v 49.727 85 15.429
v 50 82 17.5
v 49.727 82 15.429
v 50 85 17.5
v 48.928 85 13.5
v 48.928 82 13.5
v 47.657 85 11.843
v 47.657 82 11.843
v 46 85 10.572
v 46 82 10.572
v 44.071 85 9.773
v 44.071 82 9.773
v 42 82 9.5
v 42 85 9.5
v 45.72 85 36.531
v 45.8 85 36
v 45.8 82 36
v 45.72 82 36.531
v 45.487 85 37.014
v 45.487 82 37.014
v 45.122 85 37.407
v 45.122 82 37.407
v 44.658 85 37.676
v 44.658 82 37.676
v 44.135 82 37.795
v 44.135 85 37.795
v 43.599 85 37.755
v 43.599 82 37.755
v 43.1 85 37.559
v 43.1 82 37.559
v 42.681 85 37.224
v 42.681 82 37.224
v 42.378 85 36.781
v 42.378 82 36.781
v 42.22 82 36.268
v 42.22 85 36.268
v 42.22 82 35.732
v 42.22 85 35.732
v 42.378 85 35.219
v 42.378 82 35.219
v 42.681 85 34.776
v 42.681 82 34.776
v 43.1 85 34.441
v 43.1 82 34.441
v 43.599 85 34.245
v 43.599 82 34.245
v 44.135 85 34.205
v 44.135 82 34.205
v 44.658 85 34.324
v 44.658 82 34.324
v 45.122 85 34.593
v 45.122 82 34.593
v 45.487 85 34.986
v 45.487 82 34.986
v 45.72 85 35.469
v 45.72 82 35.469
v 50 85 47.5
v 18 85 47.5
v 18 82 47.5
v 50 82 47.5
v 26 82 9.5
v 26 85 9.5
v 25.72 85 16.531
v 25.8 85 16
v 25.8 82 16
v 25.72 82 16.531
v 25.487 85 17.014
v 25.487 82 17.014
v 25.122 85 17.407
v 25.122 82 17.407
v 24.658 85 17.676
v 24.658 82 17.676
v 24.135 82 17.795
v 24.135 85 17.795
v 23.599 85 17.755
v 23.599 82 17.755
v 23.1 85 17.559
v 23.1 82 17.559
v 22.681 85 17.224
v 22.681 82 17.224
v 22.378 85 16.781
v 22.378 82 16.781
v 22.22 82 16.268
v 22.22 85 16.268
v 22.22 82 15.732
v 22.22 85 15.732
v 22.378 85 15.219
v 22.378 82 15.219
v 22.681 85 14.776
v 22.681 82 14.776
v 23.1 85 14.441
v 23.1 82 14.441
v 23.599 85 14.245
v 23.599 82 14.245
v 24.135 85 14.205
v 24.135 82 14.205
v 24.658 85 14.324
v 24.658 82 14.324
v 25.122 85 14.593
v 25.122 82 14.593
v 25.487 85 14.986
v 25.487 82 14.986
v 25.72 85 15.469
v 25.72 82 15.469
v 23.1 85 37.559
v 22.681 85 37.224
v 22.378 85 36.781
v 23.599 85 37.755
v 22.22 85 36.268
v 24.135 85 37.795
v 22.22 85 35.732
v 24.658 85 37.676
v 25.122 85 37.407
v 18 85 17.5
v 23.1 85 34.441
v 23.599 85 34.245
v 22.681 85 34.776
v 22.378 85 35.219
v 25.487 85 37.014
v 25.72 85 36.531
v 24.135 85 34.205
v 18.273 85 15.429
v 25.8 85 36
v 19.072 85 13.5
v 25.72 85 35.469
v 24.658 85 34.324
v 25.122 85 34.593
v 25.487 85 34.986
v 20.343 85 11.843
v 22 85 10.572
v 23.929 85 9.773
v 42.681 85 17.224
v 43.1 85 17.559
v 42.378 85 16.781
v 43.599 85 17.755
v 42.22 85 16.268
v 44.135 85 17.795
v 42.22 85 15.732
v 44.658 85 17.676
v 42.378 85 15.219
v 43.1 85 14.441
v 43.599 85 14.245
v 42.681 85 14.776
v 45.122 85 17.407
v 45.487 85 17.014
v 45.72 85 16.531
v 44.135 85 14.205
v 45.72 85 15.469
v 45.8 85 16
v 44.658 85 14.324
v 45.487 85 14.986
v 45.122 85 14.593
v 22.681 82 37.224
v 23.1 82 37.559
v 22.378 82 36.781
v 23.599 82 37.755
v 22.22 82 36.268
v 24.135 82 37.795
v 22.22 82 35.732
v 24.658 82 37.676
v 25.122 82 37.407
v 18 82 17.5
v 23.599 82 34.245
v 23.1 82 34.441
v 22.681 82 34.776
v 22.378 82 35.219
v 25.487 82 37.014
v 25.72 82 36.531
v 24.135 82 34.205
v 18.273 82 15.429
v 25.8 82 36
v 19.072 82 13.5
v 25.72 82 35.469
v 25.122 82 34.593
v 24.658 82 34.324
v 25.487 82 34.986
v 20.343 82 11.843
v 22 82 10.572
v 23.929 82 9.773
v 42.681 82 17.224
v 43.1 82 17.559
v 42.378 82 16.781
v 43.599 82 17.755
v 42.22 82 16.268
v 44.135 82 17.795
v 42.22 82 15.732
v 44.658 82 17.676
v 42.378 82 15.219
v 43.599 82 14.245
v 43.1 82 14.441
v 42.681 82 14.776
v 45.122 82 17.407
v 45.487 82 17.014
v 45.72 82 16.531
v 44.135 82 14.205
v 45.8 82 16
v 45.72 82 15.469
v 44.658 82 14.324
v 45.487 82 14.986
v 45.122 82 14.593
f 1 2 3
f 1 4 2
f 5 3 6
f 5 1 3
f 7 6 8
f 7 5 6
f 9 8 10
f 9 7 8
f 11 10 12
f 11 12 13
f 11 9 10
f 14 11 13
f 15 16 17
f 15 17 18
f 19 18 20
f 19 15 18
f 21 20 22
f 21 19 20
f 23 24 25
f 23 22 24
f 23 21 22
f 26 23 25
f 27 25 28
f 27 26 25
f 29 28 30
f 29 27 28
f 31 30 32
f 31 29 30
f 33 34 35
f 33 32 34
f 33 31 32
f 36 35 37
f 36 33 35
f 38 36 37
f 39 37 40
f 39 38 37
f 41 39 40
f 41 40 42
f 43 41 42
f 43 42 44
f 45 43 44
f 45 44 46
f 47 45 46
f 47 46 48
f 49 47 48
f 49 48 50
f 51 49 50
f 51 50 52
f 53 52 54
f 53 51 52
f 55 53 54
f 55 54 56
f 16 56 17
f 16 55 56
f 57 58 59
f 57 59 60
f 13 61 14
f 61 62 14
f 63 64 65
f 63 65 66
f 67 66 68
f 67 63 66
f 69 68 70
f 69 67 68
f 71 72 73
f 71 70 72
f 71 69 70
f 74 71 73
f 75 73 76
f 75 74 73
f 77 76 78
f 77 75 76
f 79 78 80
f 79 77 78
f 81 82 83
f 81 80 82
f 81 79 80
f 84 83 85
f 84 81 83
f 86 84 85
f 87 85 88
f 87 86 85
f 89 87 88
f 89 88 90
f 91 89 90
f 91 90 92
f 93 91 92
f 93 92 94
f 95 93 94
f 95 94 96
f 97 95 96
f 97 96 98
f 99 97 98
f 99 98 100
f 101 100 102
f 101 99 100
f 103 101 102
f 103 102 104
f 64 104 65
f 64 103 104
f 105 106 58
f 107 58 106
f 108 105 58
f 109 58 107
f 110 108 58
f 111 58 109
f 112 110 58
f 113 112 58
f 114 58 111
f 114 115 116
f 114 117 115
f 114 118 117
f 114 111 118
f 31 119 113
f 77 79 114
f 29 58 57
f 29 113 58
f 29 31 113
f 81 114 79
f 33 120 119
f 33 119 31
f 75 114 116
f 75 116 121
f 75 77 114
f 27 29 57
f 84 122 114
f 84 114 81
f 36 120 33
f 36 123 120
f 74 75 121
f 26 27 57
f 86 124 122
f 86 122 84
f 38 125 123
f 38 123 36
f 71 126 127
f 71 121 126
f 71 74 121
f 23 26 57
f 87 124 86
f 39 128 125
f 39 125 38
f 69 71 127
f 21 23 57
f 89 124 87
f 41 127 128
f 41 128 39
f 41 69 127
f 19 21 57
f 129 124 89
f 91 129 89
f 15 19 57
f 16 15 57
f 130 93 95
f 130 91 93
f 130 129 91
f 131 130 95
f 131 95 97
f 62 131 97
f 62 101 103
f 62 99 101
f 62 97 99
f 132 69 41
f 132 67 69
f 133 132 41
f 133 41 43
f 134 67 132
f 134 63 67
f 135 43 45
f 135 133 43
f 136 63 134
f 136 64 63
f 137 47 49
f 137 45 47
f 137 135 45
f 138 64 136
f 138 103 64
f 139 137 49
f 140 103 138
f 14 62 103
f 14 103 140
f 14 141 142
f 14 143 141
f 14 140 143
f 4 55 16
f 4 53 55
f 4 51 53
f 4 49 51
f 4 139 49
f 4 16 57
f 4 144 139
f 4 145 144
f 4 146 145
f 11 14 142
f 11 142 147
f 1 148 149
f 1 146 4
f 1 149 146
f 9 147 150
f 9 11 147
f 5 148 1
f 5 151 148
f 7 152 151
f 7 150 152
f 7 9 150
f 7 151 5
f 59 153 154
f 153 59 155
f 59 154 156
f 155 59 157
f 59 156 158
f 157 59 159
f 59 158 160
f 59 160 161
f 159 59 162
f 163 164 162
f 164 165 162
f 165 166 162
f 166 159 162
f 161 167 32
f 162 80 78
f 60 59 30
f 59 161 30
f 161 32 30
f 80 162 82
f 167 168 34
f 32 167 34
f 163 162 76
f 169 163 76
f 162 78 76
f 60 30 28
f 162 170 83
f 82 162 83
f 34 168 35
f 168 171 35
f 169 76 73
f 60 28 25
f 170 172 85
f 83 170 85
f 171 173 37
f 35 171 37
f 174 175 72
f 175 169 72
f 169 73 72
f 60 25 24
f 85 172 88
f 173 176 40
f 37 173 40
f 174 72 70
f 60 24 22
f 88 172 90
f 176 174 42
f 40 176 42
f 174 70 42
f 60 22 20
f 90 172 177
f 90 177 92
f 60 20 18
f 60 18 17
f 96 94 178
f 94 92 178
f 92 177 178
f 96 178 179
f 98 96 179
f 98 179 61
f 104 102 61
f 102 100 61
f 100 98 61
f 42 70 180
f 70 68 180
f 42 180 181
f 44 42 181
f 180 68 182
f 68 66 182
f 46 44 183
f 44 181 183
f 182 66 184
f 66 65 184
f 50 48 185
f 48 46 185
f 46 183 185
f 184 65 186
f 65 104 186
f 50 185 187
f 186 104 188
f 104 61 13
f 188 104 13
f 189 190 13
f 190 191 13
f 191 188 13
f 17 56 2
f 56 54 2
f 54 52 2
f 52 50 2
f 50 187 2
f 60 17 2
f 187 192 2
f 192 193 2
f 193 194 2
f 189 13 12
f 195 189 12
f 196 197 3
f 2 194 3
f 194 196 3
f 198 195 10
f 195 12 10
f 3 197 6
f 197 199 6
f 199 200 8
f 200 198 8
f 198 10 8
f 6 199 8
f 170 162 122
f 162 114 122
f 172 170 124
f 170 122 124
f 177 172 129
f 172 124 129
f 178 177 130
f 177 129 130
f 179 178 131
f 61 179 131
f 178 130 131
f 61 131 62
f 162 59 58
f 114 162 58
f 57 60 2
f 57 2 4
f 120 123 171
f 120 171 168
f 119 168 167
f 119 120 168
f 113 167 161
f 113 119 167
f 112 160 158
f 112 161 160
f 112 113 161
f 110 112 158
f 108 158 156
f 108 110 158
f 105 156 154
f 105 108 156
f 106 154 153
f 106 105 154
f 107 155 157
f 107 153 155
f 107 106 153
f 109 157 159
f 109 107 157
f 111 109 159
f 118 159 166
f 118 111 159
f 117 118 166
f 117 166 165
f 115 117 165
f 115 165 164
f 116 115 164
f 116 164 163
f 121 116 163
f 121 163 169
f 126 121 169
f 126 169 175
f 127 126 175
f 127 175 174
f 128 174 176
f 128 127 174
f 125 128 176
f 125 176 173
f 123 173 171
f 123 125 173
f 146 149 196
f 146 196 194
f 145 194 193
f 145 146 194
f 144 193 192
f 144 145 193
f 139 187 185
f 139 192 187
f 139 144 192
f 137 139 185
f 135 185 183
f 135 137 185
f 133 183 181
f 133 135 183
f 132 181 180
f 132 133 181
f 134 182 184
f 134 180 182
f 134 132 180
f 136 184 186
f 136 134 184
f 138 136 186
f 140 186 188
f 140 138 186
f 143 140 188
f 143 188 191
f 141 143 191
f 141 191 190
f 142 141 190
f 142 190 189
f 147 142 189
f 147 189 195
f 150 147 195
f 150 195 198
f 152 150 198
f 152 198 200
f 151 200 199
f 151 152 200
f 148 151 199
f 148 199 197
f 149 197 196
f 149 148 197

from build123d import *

# Parameters (mm, degrees)
CYLINDER007_R            = 1.8
CYLINDER007_DEPTH        = 10
ARRAY004_X_COUNT         = 2
ARRAY004_X_PITCH         = 20
ARRAY004_Y_COUNT         = 2
ARRAY004_Y_PITCH         = 20
ARRAY004_PLACEMENT_ANGLE = 90
BOX021_W                 = 32
BOX021_H                 = 3
BOX021_DEPTH             = 38
FILLET_R                 = 8


with BuildPart() as top_bolt_hole_array:
    # Cylinder007 → Cylinder007 (new body)
    with BuildSketch(Plane.XY):
        Circle(CYLINDER007_R)
    extrude(amount=CYLINDER007_DEPTH)

    # Array004 X: top bolt hole array ×2


with BuildPart() as top_bolt_hole_array_1:
    add(top_bolt_hole_array.part)
    with Locations(*[(i * ARRAY004_X_PITCH, 0, 0) for i in range(1, ARRAY004_X_COUNT)]):
        add(top_bolt_hole_array.part)

    # Array004 Y: top bolt hole array ×2


with BuildPart() as top_bolt_hole_array_2:
    add(top_bolt_hole_array_1.part)
    with Locations(*[(0, i * ARRAY004_Y_PITCH, 0) for i in range(1, ARRAY004_Y_COUNT)]):
        add(top_bolt_hole_array_1.part)


with BuildPart() as top_bolt_hole_array_3:
    # Array004 placement: moved
    add(top_bolt_hole_array_2.part.moved(Location((24, 88, 16))).rotate(Axis((24, 88, 16), (1, 0, 0)), ARRAY004_PLACEMENT_ANGLE))


with BuildPart() as cut001005:
    # Box021 → Box021 (new body)
    with BuildSketch(Plane(origin=(18, 82, 9.5), x_dir=(1, 0, 0), z_dir=(0, 0, 1))):
        with Locations((16, 1.5)):
            Rectangle(BOX021_W, BOX021_H)
    extrude(amount=BOX021_DEPTH)

    # Fillet
    fillet_edges = [cut001005.edges().sort_by_distance(p)[0] for p in [
        (18, 83.5, 9.5),
        (50, 83.5, 9.5),
    ]]
    fillet(fillet_edges, radius=FILLET_R)

    # Cut001005: cut top bolt hole array
    add(top_bolt_hole_array_3.part, mode=Mode.SUBTRACT)


solid = cut001005.part
